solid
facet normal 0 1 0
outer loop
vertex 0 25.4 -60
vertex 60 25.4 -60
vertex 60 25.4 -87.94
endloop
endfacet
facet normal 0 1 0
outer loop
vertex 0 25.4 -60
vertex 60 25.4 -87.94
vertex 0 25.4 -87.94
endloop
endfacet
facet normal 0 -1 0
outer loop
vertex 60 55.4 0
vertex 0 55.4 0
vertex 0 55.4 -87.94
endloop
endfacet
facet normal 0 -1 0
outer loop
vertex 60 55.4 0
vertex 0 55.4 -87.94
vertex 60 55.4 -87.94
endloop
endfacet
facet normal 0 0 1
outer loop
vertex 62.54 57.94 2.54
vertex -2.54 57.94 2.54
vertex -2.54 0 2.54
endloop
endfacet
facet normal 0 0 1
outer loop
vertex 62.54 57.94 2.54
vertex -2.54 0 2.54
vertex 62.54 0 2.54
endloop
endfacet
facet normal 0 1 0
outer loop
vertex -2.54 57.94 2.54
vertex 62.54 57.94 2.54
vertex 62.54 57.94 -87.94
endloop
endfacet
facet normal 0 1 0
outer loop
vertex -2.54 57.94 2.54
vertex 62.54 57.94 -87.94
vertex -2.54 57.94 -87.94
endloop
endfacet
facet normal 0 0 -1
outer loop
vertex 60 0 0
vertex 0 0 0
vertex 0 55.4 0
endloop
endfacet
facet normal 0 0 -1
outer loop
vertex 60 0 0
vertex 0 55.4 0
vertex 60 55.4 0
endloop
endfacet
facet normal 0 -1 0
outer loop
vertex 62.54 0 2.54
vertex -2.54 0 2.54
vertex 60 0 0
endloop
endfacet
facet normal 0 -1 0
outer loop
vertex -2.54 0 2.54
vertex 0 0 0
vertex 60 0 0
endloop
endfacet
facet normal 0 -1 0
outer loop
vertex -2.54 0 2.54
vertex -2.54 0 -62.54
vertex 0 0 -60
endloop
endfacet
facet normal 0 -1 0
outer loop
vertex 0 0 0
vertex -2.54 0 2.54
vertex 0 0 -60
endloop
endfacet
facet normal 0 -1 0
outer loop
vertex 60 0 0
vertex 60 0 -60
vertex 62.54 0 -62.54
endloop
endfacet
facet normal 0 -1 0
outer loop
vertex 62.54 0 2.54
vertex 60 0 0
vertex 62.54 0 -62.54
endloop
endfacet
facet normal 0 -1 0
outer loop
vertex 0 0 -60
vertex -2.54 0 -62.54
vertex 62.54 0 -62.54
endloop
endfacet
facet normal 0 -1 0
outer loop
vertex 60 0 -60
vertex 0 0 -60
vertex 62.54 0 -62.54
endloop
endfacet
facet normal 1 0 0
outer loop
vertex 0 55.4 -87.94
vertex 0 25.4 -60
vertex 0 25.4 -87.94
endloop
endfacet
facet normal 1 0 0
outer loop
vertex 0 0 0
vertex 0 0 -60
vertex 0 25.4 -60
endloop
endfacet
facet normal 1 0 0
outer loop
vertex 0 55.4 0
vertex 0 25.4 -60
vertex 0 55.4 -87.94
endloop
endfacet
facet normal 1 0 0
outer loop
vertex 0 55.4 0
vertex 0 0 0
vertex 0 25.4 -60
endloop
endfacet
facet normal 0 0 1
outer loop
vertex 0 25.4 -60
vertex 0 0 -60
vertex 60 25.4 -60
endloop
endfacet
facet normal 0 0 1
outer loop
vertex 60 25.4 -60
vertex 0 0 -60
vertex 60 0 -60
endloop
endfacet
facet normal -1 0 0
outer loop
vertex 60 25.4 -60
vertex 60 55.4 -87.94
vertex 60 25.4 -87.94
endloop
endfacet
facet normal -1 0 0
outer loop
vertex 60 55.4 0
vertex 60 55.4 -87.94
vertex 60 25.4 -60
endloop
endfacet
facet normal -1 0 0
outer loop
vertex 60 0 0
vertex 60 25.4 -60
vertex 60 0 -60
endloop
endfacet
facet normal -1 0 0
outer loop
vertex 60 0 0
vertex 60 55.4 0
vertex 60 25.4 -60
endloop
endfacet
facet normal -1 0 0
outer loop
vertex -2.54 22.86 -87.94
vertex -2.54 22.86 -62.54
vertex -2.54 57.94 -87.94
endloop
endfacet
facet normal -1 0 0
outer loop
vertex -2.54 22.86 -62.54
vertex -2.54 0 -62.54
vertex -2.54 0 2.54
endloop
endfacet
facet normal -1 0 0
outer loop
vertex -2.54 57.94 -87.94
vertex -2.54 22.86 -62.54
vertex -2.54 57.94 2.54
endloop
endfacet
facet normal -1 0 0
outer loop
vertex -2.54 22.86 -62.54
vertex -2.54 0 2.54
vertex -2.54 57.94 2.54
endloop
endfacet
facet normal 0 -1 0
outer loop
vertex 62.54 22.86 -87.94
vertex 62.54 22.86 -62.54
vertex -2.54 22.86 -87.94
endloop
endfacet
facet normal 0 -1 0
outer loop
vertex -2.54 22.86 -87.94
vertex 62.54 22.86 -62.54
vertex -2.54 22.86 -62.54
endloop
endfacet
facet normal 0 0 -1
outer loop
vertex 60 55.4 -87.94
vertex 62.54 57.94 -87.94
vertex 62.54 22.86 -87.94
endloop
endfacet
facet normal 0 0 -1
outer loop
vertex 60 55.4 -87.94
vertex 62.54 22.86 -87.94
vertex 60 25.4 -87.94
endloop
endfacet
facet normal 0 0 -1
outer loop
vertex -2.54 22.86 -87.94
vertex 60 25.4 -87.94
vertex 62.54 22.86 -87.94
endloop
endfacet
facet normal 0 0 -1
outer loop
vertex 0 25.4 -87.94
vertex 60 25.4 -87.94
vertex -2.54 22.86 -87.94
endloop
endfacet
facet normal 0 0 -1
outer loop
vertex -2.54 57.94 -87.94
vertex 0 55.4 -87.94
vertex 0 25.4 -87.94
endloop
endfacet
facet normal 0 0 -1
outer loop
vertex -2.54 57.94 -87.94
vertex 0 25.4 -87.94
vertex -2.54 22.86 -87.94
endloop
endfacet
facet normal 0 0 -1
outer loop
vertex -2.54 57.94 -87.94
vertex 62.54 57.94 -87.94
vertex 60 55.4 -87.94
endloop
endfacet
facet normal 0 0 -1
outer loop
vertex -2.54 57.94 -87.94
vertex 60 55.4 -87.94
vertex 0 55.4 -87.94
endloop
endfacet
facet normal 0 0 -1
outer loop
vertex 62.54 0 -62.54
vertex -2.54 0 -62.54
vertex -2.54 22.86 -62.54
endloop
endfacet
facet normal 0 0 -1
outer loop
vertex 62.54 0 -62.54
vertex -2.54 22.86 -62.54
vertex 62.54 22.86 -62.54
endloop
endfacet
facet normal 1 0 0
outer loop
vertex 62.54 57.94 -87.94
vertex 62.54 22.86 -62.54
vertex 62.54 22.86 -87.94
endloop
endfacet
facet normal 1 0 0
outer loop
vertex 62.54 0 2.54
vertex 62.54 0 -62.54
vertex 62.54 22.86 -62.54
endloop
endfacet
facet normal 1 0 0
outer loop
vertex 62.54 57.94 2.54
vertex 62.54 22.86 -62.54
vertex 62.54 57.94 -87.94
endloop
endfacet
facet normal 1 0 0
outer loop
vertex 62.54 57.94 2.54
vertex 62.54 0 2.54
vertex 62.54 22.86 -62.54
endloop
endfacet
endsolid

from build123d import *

# Parameters (mm, degrees)
SKETCH1_W                = 65.08
SKETCH1_H                = 65.08
SKETCH1_W_2              = 60
SKETCH1_H_2              = 60
BOSS_EXTRUDE1_DEPTH      = 25.4
BOSS_EXTRUDE2_DEPTH      = 25.4
BOSS_EXTRUDE2_DEPTH_BACK = 65.08
SKETCH4_W                = 65.08
SKETCH4_H                = 2.54
BOSS_EXTRUDE3_DEPTH      = 25.4
SKETCH5_W                = 60
SKETCH5_H                = 30
BOSS_EXTRUDE4_DEPTH      = 2.54


with BuildPart() as part:
    # Sketch1 → Boss-Extrude1 (new body)
    with BuildSketch(Plane(origin=(0, 0, 0), x_dir=(1, 0, 0), z_dir=(0, 1, 0))):
        with Locations((30, 30)):
            Rectangle(SKETCH1_W, SKETCH1_H)
        with Locations((30, 30)):
            Rectangle(SKETCH1_W_2, SKETCH1_H_2, mode=Mode.SUBTRACT)
    extrude(amount=BOSS_EXTRUDE1_DEPTH)

    # Sketch2 → Boss-Extrude2 (add, two sides: drawn at the far end of the back side and taken through both)
    with BuildSketch(Plane(origin=(0, 0, -62.54), x_dir=(-1, 0, 0), z_dir=(0, 0, -1)).offset(-BOSS_EXTRUDE2_DEPTH_BACK)):
        Polygon((0, 25.4), (0, 55.4), (-60, 55.4), (-60, 25.4), (-62.54, 25.4), (-62.54, 57.94), (2.54, 57.94), (2.54, 25.4), align=None)
    extrude(amount=BOSS_EXTRUDE2_DEPTH + BOSS_EXTRUDE2_DEPTH_BACK)

    # Sketch4 → Boss-Extrude3 (add)
    with BuildSketch(Plane(origin=(0, 0, -62.54), x_dir=(-1, 0, 0), z_dir=(0, 0, -1))):
        with Locations((-30, 24.13)):
            Rectangle(SKETCH4_W, SKETCH4_H)
    extrude(amount=BOSS_EXTRUDE3_DEPTH)

    # Sketch5 → Boss-Extrude4 (add)
    with BuildSketch(Plane.XY.offset(2.54)):
        with Locations((30, 40.4)):
            Rectangle(SKETCH5_W, SKETCH5_H)
    extrude(amount=-BOSS_EXTRUDE4_DEPTH)


solid = part.part
